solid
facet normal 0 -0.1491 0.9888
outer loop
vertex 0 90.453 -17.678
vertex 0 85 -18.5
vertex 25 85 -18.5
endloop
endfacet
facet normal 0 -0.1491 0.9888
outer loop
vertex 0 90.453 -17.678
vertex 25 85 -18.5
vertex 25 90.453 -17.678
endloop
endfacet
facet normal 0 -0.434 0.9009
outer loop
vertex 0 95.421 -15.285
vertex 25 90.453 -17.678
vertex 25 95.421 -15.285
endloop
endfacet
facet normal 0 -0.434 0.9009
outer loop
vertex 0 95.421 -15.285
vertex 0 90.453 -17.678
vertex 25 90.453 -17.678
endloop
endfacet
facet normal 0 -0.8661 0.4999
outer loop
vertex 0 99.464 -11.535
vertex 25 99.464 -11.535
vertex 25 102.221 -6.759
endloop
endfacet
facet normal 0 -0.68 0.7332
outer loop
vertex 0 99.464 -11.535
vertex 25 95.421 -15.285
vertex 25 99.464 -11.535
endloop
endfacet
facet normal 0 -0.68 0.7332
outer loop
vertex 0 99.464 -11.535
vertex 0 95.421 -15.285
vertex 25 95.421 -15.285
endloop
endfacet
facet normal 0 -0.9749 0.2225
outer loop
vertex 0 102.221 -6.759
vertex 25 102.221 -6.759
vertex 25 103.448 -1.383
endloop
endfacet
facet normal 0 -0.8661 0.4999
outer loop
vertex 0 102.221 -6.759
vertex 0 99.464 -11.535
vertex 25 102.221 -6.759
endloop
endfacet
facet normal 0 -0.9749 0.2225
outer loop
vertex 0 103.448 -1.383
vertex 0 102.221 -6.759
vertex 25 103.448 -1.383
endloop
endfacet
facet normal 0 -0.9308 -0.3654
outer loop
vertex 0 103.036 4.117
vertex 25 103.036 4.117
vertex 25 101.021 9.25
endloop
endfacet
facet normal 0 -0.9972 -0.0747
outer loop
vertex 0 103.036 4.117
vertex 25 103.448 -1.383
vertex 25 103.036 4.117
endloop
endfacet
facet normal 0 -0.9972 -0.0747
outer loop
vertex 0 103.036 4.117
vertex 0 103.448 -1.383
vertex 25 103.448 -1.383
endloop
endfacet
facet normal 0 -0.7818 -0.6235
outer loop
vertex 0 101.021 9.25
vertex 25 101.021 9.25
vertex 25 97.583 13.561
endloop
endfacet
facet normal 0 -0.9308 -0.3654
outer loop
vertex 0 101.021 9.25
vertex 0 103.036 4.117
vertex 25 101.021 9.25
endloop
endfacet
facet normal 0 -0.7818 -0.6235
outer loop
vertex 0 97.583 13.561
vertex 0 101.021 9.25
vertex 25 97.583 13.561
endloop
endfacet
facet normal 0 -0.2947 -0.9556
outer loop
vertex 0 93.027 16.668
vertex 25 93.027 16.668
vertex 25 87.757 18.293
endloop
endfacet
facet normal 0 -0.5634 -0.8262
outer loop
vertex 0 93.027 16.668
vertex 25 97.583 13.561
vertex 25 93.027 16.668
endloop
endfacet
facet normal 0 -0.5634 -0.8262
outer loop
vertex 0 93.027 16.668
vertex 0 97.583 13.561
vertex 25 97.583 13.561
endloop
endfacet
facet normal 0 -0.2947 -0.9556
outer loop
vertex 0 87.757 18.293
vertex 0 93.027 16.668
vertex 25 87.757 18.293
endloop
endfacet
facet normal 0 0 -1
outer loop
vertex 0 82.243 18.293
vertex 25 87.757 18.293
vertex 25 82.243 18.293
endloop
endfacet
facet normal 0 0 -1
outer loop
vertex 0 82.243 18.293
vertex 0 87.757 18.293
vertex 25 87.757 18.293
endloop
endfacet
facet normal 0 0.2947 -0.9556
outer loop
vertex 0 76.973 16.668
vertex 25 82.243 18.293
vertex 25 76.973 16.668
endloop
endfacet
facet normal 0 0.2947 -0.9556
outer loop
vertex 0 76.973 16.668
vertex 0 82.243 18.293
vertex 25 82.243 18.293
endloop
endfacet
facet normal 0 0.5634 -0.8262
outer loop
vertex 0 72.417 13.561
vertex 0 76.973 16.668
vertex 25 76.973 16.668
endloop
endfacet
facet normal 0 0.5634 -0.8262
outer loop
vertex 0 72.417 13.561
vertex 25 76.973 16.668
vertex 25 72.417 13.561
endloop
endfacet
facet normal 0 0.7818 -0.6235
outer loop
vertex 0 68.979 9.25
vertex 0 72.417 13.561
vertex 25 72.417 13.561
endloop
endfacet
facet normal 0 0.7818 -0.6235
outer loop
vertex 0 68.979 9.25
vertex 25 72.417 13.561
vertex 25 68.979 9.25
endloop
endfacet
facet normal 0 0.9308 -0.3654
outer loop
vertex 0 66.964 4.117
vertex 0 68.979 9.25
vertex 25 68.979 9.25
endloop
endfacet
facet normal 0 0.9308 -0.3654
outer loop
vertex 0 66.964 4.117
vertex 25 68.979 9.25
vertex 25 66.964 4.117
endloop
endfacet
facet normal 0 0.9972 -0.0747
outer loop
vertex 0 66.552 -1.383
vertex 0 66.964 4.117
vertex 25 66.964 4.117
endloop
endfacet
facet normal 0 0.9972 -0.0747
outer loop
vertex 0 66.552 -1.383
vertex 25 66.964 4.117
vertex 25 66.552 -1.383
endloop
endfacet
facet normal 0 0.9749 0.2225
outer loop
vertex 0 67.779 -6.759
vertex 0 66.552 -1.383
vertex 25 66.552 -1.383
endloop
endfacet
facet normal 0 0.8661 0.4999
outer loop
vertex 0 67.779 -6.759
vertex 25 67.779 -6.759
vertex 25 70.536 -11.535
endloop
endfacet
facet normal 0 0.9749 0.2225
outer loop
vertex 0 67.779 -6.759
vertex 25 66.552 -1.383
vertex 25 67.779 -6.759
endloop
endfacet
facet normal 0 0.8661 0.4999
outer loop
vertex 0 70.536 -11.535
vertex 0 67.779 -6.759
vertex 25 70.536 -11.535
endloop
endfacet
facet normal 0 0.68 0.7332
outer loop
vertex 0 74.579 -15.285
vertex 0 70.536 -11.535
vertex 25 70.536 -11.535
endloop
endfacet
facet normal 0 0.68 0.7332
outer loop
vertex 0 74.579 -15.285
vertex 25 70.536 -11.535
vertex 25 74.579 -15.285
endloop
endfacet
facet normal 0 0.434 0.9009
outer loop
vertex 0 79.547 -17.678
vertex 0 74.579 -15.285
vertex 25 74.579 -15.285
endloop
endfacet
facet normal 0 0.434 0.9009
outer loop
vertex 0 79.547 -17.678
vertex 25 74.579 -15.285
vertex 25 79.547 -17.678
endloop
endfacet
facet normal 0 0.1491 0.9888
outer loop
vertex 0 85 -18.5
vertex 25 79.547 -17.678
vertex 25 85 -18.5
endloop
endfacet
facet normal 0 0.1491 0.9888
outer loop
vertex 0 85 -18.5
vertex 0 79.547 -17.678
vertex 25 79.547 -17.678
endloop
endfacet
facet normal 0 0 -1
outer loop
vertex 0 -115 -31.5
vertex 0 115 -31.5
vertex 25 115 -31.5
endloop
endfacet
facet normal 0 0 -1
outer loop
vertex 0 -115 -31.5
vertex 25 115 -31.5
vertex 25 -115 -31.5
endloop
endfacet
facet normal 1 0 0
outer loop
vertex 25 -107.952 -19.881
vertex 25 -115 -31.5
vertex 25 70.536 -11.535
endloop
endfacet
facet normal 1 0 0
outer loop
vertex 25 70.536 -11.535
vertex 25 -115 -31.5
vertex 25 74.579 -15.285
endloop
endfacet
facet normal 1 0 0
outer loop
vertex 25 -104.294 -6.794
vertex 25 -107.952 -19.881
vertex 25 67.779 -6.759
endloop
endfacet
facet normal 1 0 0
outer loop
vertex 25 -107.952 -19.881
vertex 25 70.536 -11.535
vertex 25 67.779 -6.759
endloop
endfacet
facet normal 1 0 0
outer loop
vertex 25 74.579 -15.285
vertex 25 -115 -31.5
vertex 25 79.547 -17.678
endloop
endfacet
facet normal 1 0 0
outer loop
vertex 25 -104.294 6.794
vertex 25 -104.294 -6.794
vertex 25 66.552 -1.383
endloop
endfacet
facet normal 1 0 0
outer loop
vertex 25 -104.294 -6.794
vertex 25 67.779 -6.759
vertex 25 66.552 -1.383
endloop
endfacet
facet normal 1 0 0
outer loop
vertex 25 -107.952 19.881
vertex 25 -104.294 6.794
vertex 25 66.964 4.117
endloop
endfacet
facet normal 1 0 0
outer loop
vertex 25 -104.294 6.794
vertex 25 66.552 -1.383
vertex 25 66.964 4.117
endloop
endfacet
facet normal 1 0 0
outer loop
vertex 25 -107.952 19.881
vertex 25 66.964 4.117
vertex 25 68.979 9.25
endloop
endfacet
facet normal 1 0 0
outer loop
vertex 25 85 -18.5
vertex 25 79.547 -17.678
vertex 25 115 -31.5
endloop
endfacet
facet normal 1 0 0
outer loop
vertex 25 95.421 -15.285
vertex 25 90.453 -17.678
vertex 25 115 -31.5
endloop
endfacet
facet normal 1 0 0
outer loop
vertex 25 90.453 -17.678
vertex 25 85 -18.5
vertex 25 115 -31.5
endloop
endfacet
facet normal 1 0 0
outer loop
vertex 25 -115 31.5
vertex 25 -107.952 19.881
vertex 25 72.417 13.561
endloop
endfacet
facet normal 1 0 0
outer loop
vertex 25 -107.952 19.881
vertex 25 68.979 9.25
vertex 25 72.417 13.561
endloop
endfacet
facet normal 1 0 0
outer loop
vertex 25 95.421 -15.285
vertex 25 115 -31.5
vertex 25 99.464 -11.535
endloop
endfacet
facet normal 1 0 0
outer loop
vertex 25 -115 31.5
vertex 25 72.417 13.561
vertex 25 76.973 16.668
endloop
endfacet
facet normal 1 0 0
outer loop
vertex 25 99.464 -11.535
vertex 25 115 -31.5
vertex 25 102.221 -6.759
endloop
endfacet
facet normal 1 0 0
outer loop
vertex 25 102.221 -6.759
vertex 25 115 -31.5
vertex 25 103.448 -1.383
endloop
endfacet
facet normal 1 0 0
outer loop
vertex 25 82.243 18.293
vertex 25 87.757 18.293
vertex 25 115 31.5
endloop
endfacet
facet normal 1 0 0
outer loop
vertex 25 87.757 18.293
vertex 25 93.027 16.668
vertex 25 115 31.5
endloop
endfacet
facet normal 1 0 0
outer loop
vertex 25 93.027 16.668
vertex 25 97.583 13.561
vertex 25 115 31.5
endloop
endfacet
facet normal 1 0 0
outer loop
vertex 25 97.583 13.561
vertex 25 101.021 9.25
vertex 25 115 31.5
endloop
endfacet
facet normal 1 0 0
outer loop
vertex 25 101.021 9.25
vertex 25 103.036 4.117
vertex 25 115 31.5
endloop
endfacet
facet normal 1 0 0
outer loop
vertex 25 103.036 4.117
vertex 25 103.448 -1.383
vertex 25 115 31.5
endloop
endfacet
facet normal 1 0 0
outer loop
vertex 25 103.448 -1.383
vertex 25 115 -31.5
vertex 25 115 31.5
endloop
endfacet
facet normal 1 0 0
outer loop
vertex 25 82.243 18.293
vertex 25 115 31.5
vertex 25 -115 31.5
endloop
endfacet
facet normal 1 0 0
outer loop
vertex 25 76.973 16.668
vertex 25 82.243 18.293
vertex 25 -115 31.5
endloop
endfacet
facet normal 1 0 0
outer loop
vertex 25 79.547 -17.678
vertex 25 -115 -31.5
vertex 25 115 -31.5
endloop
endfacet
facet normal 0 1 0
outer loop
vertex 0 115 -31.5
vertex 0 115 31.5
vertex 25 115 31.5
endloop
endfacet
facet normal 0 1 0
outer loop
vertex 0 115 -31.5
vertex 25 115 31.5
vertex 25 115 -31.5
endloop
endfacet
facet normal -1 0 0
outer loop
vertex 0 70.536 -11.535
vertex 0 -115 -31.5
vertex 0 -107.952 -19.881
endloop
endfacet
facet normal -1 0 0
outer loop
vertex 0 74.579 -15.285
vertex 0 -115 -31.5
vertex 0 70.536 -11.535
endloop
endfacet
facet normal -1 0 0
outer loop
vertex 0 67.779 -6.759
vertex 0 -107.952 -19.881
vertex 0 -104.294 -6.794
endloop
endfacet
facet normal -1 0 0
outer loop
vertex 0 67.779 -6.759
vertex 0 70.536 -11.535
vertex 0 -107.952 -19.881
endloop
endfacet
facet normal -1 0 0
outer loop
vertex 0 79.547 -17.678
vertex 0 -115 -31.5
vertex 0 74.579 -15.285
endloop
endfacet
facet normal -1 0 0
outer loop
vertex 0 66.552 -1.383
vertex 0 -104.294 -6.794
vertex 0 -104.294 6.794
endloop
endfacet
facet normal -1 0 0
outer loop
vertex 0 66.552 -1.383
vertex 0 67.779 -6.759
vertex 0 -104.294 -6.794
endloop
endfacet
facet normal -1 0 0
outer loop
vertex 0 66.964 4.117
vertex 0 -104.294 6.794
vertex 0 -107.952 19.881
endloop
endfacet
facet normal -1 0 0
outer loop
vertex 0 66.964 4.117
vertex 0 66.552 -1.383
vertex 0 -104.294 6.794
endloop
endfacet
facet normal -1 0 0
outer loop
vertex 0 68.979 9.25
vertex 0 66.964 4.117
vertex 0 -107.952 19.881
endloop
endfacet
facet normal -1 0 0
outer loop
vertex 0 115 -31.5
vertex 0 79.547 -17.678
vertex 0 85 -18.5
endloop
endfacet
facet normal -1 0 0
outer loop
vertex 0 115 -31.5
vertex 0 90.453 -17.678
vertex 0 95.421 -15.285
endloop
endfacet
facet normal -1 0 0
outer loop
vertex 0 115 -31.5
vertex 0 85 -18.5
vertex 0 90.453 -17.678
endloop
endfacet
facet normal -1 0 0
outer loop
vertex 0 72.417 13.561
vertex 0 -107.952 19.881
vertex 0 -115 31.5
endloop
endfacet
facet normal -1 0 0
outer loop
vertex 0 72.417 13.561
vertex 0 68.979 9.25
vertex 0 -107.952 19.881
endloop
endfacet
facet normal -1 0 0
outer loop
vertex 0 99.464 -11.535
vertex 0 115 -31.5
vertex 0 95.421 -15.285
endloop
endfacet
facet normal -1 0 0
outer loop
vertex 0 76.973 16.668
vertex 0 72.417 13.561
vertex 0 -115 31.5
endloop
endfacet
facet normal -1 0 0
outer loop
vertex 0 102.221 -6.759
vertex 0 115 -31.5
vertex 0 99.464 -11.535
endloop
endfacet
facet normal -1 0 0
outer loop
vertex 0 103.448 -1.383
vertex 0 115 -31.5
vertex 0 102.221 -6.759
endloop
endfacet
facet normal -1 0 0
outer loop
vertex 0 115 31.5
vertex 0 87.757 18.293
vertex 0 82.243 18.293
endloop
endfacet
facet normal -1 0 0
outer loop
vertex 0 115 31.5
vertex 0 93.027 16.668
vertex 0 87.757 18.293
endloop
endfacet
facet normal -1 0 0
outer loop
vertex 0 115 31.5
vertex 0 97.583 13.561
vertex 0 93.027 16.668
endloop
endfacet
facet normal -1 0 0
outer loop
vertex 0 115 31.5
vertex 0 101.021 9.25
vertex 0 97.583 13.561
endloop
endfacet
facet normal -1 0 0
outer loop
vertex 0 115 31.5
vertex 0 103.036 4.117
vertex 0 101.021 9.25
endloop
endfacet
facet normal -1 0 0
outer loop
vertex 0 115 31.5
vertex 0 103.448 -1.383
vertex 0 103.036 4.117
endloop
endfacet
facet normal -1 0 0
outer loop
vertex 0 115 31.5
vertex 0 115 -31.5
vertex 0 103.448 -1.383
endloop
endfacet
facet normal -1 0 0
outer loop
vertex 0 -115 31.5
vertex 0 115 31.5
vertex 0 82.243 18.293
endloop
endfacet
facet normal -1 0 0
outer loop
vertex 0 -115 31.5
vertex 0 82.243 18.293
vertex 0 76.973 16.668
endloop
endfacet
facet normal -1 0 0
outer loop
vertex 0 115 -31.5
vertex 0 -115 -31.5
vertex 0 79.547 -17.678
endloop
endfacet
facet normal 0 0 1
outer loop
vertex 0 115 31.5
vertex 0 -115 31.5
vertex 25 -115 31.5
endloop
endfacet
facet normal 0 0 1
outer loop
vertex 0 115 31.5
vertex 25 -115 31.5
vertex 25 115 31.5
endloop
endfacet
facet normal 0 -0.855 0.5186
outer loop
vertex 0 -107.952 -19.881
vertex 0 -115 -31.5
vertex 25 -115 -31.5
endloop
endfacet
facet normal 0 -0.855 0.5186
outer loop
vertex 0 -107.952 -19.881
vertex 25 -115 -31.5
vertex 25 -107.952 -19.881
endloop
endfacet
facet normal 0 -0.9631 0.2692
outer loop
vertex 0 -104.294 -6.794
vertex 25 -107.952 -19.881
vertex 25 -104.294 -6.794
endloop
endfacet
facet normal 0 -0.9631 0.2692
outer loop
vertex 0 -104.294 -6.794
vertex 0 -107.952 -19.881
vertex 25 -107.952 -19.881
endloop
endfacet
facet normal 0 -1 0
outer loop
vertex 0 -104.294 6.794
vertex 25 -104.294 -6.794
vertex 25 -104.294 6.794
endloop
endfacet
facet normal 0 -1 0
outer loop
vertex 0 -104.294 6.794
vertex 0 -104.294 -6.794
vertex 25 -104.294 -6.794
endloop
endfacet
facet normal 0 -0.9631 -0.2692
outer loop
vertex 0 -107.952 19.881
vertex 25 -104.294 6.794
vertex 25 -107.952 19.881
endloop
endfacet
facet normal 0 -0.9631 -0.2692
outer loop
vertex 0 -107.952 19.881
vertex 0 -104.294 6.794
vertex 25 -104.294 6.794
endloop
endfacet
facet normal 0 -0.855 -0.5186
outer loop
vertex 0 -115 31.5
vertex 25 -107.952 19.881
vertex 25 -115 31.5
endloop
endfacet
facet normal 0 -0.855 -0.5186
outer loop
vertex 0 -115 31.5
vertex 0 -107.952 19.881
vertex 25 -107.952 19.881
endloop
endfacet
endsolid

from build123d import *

# Parameters (mm, degrees)
BOSS_EXTRUDE1_DEPTH     = 25
CUT_EXTRUDE1_DEPTH      = 122.828773284
CUT_EXTRUDE1_DEPTH_BACK = 122.828773284
SKETCH2_R               = 18.5


with BuildPart() as part:
    # Sketch1 → Boss-Extrude1 (new body)
    with BuildSketch(Plane(origin=(0, 0, 0), x_dir=(0, 0, -1), z_dir=(1, 0, 0))):
        with BuildLine():
            Line((-31.5, -115), (-31.5, 115))
            Line((-31.5, 115), (31.5, 115))
            Line((31.5, 115), (31.5, -115))
            ThreePointArc((31.5, -115), (0, -103.829756631), (-31.5, -115))
        make_face()
    extrude(amount=BOSS_EXTRUDE1_DEPTH)

    # Sketch2 → Cut-Extrude1 (cut, two sides: drawn at the far end of the back side and taken through both)
    with BuildSketch(Plane(origin=(25, 0, 0), x_dir=(0, 0, -1), z_dir=(1, 0, 0)).offset(-CUT_EXTRUDE1_DEPTH_BACK)):
        with Locations((0, 85)):
            Circle(SKETCH2_R)
    extrude(amount=CUT_EXTRUDE1_DEPTH + CUT_EXTRUDE1_DEPTH_BACK, mode=Mode.SUBTRACT)


solid = part.part
